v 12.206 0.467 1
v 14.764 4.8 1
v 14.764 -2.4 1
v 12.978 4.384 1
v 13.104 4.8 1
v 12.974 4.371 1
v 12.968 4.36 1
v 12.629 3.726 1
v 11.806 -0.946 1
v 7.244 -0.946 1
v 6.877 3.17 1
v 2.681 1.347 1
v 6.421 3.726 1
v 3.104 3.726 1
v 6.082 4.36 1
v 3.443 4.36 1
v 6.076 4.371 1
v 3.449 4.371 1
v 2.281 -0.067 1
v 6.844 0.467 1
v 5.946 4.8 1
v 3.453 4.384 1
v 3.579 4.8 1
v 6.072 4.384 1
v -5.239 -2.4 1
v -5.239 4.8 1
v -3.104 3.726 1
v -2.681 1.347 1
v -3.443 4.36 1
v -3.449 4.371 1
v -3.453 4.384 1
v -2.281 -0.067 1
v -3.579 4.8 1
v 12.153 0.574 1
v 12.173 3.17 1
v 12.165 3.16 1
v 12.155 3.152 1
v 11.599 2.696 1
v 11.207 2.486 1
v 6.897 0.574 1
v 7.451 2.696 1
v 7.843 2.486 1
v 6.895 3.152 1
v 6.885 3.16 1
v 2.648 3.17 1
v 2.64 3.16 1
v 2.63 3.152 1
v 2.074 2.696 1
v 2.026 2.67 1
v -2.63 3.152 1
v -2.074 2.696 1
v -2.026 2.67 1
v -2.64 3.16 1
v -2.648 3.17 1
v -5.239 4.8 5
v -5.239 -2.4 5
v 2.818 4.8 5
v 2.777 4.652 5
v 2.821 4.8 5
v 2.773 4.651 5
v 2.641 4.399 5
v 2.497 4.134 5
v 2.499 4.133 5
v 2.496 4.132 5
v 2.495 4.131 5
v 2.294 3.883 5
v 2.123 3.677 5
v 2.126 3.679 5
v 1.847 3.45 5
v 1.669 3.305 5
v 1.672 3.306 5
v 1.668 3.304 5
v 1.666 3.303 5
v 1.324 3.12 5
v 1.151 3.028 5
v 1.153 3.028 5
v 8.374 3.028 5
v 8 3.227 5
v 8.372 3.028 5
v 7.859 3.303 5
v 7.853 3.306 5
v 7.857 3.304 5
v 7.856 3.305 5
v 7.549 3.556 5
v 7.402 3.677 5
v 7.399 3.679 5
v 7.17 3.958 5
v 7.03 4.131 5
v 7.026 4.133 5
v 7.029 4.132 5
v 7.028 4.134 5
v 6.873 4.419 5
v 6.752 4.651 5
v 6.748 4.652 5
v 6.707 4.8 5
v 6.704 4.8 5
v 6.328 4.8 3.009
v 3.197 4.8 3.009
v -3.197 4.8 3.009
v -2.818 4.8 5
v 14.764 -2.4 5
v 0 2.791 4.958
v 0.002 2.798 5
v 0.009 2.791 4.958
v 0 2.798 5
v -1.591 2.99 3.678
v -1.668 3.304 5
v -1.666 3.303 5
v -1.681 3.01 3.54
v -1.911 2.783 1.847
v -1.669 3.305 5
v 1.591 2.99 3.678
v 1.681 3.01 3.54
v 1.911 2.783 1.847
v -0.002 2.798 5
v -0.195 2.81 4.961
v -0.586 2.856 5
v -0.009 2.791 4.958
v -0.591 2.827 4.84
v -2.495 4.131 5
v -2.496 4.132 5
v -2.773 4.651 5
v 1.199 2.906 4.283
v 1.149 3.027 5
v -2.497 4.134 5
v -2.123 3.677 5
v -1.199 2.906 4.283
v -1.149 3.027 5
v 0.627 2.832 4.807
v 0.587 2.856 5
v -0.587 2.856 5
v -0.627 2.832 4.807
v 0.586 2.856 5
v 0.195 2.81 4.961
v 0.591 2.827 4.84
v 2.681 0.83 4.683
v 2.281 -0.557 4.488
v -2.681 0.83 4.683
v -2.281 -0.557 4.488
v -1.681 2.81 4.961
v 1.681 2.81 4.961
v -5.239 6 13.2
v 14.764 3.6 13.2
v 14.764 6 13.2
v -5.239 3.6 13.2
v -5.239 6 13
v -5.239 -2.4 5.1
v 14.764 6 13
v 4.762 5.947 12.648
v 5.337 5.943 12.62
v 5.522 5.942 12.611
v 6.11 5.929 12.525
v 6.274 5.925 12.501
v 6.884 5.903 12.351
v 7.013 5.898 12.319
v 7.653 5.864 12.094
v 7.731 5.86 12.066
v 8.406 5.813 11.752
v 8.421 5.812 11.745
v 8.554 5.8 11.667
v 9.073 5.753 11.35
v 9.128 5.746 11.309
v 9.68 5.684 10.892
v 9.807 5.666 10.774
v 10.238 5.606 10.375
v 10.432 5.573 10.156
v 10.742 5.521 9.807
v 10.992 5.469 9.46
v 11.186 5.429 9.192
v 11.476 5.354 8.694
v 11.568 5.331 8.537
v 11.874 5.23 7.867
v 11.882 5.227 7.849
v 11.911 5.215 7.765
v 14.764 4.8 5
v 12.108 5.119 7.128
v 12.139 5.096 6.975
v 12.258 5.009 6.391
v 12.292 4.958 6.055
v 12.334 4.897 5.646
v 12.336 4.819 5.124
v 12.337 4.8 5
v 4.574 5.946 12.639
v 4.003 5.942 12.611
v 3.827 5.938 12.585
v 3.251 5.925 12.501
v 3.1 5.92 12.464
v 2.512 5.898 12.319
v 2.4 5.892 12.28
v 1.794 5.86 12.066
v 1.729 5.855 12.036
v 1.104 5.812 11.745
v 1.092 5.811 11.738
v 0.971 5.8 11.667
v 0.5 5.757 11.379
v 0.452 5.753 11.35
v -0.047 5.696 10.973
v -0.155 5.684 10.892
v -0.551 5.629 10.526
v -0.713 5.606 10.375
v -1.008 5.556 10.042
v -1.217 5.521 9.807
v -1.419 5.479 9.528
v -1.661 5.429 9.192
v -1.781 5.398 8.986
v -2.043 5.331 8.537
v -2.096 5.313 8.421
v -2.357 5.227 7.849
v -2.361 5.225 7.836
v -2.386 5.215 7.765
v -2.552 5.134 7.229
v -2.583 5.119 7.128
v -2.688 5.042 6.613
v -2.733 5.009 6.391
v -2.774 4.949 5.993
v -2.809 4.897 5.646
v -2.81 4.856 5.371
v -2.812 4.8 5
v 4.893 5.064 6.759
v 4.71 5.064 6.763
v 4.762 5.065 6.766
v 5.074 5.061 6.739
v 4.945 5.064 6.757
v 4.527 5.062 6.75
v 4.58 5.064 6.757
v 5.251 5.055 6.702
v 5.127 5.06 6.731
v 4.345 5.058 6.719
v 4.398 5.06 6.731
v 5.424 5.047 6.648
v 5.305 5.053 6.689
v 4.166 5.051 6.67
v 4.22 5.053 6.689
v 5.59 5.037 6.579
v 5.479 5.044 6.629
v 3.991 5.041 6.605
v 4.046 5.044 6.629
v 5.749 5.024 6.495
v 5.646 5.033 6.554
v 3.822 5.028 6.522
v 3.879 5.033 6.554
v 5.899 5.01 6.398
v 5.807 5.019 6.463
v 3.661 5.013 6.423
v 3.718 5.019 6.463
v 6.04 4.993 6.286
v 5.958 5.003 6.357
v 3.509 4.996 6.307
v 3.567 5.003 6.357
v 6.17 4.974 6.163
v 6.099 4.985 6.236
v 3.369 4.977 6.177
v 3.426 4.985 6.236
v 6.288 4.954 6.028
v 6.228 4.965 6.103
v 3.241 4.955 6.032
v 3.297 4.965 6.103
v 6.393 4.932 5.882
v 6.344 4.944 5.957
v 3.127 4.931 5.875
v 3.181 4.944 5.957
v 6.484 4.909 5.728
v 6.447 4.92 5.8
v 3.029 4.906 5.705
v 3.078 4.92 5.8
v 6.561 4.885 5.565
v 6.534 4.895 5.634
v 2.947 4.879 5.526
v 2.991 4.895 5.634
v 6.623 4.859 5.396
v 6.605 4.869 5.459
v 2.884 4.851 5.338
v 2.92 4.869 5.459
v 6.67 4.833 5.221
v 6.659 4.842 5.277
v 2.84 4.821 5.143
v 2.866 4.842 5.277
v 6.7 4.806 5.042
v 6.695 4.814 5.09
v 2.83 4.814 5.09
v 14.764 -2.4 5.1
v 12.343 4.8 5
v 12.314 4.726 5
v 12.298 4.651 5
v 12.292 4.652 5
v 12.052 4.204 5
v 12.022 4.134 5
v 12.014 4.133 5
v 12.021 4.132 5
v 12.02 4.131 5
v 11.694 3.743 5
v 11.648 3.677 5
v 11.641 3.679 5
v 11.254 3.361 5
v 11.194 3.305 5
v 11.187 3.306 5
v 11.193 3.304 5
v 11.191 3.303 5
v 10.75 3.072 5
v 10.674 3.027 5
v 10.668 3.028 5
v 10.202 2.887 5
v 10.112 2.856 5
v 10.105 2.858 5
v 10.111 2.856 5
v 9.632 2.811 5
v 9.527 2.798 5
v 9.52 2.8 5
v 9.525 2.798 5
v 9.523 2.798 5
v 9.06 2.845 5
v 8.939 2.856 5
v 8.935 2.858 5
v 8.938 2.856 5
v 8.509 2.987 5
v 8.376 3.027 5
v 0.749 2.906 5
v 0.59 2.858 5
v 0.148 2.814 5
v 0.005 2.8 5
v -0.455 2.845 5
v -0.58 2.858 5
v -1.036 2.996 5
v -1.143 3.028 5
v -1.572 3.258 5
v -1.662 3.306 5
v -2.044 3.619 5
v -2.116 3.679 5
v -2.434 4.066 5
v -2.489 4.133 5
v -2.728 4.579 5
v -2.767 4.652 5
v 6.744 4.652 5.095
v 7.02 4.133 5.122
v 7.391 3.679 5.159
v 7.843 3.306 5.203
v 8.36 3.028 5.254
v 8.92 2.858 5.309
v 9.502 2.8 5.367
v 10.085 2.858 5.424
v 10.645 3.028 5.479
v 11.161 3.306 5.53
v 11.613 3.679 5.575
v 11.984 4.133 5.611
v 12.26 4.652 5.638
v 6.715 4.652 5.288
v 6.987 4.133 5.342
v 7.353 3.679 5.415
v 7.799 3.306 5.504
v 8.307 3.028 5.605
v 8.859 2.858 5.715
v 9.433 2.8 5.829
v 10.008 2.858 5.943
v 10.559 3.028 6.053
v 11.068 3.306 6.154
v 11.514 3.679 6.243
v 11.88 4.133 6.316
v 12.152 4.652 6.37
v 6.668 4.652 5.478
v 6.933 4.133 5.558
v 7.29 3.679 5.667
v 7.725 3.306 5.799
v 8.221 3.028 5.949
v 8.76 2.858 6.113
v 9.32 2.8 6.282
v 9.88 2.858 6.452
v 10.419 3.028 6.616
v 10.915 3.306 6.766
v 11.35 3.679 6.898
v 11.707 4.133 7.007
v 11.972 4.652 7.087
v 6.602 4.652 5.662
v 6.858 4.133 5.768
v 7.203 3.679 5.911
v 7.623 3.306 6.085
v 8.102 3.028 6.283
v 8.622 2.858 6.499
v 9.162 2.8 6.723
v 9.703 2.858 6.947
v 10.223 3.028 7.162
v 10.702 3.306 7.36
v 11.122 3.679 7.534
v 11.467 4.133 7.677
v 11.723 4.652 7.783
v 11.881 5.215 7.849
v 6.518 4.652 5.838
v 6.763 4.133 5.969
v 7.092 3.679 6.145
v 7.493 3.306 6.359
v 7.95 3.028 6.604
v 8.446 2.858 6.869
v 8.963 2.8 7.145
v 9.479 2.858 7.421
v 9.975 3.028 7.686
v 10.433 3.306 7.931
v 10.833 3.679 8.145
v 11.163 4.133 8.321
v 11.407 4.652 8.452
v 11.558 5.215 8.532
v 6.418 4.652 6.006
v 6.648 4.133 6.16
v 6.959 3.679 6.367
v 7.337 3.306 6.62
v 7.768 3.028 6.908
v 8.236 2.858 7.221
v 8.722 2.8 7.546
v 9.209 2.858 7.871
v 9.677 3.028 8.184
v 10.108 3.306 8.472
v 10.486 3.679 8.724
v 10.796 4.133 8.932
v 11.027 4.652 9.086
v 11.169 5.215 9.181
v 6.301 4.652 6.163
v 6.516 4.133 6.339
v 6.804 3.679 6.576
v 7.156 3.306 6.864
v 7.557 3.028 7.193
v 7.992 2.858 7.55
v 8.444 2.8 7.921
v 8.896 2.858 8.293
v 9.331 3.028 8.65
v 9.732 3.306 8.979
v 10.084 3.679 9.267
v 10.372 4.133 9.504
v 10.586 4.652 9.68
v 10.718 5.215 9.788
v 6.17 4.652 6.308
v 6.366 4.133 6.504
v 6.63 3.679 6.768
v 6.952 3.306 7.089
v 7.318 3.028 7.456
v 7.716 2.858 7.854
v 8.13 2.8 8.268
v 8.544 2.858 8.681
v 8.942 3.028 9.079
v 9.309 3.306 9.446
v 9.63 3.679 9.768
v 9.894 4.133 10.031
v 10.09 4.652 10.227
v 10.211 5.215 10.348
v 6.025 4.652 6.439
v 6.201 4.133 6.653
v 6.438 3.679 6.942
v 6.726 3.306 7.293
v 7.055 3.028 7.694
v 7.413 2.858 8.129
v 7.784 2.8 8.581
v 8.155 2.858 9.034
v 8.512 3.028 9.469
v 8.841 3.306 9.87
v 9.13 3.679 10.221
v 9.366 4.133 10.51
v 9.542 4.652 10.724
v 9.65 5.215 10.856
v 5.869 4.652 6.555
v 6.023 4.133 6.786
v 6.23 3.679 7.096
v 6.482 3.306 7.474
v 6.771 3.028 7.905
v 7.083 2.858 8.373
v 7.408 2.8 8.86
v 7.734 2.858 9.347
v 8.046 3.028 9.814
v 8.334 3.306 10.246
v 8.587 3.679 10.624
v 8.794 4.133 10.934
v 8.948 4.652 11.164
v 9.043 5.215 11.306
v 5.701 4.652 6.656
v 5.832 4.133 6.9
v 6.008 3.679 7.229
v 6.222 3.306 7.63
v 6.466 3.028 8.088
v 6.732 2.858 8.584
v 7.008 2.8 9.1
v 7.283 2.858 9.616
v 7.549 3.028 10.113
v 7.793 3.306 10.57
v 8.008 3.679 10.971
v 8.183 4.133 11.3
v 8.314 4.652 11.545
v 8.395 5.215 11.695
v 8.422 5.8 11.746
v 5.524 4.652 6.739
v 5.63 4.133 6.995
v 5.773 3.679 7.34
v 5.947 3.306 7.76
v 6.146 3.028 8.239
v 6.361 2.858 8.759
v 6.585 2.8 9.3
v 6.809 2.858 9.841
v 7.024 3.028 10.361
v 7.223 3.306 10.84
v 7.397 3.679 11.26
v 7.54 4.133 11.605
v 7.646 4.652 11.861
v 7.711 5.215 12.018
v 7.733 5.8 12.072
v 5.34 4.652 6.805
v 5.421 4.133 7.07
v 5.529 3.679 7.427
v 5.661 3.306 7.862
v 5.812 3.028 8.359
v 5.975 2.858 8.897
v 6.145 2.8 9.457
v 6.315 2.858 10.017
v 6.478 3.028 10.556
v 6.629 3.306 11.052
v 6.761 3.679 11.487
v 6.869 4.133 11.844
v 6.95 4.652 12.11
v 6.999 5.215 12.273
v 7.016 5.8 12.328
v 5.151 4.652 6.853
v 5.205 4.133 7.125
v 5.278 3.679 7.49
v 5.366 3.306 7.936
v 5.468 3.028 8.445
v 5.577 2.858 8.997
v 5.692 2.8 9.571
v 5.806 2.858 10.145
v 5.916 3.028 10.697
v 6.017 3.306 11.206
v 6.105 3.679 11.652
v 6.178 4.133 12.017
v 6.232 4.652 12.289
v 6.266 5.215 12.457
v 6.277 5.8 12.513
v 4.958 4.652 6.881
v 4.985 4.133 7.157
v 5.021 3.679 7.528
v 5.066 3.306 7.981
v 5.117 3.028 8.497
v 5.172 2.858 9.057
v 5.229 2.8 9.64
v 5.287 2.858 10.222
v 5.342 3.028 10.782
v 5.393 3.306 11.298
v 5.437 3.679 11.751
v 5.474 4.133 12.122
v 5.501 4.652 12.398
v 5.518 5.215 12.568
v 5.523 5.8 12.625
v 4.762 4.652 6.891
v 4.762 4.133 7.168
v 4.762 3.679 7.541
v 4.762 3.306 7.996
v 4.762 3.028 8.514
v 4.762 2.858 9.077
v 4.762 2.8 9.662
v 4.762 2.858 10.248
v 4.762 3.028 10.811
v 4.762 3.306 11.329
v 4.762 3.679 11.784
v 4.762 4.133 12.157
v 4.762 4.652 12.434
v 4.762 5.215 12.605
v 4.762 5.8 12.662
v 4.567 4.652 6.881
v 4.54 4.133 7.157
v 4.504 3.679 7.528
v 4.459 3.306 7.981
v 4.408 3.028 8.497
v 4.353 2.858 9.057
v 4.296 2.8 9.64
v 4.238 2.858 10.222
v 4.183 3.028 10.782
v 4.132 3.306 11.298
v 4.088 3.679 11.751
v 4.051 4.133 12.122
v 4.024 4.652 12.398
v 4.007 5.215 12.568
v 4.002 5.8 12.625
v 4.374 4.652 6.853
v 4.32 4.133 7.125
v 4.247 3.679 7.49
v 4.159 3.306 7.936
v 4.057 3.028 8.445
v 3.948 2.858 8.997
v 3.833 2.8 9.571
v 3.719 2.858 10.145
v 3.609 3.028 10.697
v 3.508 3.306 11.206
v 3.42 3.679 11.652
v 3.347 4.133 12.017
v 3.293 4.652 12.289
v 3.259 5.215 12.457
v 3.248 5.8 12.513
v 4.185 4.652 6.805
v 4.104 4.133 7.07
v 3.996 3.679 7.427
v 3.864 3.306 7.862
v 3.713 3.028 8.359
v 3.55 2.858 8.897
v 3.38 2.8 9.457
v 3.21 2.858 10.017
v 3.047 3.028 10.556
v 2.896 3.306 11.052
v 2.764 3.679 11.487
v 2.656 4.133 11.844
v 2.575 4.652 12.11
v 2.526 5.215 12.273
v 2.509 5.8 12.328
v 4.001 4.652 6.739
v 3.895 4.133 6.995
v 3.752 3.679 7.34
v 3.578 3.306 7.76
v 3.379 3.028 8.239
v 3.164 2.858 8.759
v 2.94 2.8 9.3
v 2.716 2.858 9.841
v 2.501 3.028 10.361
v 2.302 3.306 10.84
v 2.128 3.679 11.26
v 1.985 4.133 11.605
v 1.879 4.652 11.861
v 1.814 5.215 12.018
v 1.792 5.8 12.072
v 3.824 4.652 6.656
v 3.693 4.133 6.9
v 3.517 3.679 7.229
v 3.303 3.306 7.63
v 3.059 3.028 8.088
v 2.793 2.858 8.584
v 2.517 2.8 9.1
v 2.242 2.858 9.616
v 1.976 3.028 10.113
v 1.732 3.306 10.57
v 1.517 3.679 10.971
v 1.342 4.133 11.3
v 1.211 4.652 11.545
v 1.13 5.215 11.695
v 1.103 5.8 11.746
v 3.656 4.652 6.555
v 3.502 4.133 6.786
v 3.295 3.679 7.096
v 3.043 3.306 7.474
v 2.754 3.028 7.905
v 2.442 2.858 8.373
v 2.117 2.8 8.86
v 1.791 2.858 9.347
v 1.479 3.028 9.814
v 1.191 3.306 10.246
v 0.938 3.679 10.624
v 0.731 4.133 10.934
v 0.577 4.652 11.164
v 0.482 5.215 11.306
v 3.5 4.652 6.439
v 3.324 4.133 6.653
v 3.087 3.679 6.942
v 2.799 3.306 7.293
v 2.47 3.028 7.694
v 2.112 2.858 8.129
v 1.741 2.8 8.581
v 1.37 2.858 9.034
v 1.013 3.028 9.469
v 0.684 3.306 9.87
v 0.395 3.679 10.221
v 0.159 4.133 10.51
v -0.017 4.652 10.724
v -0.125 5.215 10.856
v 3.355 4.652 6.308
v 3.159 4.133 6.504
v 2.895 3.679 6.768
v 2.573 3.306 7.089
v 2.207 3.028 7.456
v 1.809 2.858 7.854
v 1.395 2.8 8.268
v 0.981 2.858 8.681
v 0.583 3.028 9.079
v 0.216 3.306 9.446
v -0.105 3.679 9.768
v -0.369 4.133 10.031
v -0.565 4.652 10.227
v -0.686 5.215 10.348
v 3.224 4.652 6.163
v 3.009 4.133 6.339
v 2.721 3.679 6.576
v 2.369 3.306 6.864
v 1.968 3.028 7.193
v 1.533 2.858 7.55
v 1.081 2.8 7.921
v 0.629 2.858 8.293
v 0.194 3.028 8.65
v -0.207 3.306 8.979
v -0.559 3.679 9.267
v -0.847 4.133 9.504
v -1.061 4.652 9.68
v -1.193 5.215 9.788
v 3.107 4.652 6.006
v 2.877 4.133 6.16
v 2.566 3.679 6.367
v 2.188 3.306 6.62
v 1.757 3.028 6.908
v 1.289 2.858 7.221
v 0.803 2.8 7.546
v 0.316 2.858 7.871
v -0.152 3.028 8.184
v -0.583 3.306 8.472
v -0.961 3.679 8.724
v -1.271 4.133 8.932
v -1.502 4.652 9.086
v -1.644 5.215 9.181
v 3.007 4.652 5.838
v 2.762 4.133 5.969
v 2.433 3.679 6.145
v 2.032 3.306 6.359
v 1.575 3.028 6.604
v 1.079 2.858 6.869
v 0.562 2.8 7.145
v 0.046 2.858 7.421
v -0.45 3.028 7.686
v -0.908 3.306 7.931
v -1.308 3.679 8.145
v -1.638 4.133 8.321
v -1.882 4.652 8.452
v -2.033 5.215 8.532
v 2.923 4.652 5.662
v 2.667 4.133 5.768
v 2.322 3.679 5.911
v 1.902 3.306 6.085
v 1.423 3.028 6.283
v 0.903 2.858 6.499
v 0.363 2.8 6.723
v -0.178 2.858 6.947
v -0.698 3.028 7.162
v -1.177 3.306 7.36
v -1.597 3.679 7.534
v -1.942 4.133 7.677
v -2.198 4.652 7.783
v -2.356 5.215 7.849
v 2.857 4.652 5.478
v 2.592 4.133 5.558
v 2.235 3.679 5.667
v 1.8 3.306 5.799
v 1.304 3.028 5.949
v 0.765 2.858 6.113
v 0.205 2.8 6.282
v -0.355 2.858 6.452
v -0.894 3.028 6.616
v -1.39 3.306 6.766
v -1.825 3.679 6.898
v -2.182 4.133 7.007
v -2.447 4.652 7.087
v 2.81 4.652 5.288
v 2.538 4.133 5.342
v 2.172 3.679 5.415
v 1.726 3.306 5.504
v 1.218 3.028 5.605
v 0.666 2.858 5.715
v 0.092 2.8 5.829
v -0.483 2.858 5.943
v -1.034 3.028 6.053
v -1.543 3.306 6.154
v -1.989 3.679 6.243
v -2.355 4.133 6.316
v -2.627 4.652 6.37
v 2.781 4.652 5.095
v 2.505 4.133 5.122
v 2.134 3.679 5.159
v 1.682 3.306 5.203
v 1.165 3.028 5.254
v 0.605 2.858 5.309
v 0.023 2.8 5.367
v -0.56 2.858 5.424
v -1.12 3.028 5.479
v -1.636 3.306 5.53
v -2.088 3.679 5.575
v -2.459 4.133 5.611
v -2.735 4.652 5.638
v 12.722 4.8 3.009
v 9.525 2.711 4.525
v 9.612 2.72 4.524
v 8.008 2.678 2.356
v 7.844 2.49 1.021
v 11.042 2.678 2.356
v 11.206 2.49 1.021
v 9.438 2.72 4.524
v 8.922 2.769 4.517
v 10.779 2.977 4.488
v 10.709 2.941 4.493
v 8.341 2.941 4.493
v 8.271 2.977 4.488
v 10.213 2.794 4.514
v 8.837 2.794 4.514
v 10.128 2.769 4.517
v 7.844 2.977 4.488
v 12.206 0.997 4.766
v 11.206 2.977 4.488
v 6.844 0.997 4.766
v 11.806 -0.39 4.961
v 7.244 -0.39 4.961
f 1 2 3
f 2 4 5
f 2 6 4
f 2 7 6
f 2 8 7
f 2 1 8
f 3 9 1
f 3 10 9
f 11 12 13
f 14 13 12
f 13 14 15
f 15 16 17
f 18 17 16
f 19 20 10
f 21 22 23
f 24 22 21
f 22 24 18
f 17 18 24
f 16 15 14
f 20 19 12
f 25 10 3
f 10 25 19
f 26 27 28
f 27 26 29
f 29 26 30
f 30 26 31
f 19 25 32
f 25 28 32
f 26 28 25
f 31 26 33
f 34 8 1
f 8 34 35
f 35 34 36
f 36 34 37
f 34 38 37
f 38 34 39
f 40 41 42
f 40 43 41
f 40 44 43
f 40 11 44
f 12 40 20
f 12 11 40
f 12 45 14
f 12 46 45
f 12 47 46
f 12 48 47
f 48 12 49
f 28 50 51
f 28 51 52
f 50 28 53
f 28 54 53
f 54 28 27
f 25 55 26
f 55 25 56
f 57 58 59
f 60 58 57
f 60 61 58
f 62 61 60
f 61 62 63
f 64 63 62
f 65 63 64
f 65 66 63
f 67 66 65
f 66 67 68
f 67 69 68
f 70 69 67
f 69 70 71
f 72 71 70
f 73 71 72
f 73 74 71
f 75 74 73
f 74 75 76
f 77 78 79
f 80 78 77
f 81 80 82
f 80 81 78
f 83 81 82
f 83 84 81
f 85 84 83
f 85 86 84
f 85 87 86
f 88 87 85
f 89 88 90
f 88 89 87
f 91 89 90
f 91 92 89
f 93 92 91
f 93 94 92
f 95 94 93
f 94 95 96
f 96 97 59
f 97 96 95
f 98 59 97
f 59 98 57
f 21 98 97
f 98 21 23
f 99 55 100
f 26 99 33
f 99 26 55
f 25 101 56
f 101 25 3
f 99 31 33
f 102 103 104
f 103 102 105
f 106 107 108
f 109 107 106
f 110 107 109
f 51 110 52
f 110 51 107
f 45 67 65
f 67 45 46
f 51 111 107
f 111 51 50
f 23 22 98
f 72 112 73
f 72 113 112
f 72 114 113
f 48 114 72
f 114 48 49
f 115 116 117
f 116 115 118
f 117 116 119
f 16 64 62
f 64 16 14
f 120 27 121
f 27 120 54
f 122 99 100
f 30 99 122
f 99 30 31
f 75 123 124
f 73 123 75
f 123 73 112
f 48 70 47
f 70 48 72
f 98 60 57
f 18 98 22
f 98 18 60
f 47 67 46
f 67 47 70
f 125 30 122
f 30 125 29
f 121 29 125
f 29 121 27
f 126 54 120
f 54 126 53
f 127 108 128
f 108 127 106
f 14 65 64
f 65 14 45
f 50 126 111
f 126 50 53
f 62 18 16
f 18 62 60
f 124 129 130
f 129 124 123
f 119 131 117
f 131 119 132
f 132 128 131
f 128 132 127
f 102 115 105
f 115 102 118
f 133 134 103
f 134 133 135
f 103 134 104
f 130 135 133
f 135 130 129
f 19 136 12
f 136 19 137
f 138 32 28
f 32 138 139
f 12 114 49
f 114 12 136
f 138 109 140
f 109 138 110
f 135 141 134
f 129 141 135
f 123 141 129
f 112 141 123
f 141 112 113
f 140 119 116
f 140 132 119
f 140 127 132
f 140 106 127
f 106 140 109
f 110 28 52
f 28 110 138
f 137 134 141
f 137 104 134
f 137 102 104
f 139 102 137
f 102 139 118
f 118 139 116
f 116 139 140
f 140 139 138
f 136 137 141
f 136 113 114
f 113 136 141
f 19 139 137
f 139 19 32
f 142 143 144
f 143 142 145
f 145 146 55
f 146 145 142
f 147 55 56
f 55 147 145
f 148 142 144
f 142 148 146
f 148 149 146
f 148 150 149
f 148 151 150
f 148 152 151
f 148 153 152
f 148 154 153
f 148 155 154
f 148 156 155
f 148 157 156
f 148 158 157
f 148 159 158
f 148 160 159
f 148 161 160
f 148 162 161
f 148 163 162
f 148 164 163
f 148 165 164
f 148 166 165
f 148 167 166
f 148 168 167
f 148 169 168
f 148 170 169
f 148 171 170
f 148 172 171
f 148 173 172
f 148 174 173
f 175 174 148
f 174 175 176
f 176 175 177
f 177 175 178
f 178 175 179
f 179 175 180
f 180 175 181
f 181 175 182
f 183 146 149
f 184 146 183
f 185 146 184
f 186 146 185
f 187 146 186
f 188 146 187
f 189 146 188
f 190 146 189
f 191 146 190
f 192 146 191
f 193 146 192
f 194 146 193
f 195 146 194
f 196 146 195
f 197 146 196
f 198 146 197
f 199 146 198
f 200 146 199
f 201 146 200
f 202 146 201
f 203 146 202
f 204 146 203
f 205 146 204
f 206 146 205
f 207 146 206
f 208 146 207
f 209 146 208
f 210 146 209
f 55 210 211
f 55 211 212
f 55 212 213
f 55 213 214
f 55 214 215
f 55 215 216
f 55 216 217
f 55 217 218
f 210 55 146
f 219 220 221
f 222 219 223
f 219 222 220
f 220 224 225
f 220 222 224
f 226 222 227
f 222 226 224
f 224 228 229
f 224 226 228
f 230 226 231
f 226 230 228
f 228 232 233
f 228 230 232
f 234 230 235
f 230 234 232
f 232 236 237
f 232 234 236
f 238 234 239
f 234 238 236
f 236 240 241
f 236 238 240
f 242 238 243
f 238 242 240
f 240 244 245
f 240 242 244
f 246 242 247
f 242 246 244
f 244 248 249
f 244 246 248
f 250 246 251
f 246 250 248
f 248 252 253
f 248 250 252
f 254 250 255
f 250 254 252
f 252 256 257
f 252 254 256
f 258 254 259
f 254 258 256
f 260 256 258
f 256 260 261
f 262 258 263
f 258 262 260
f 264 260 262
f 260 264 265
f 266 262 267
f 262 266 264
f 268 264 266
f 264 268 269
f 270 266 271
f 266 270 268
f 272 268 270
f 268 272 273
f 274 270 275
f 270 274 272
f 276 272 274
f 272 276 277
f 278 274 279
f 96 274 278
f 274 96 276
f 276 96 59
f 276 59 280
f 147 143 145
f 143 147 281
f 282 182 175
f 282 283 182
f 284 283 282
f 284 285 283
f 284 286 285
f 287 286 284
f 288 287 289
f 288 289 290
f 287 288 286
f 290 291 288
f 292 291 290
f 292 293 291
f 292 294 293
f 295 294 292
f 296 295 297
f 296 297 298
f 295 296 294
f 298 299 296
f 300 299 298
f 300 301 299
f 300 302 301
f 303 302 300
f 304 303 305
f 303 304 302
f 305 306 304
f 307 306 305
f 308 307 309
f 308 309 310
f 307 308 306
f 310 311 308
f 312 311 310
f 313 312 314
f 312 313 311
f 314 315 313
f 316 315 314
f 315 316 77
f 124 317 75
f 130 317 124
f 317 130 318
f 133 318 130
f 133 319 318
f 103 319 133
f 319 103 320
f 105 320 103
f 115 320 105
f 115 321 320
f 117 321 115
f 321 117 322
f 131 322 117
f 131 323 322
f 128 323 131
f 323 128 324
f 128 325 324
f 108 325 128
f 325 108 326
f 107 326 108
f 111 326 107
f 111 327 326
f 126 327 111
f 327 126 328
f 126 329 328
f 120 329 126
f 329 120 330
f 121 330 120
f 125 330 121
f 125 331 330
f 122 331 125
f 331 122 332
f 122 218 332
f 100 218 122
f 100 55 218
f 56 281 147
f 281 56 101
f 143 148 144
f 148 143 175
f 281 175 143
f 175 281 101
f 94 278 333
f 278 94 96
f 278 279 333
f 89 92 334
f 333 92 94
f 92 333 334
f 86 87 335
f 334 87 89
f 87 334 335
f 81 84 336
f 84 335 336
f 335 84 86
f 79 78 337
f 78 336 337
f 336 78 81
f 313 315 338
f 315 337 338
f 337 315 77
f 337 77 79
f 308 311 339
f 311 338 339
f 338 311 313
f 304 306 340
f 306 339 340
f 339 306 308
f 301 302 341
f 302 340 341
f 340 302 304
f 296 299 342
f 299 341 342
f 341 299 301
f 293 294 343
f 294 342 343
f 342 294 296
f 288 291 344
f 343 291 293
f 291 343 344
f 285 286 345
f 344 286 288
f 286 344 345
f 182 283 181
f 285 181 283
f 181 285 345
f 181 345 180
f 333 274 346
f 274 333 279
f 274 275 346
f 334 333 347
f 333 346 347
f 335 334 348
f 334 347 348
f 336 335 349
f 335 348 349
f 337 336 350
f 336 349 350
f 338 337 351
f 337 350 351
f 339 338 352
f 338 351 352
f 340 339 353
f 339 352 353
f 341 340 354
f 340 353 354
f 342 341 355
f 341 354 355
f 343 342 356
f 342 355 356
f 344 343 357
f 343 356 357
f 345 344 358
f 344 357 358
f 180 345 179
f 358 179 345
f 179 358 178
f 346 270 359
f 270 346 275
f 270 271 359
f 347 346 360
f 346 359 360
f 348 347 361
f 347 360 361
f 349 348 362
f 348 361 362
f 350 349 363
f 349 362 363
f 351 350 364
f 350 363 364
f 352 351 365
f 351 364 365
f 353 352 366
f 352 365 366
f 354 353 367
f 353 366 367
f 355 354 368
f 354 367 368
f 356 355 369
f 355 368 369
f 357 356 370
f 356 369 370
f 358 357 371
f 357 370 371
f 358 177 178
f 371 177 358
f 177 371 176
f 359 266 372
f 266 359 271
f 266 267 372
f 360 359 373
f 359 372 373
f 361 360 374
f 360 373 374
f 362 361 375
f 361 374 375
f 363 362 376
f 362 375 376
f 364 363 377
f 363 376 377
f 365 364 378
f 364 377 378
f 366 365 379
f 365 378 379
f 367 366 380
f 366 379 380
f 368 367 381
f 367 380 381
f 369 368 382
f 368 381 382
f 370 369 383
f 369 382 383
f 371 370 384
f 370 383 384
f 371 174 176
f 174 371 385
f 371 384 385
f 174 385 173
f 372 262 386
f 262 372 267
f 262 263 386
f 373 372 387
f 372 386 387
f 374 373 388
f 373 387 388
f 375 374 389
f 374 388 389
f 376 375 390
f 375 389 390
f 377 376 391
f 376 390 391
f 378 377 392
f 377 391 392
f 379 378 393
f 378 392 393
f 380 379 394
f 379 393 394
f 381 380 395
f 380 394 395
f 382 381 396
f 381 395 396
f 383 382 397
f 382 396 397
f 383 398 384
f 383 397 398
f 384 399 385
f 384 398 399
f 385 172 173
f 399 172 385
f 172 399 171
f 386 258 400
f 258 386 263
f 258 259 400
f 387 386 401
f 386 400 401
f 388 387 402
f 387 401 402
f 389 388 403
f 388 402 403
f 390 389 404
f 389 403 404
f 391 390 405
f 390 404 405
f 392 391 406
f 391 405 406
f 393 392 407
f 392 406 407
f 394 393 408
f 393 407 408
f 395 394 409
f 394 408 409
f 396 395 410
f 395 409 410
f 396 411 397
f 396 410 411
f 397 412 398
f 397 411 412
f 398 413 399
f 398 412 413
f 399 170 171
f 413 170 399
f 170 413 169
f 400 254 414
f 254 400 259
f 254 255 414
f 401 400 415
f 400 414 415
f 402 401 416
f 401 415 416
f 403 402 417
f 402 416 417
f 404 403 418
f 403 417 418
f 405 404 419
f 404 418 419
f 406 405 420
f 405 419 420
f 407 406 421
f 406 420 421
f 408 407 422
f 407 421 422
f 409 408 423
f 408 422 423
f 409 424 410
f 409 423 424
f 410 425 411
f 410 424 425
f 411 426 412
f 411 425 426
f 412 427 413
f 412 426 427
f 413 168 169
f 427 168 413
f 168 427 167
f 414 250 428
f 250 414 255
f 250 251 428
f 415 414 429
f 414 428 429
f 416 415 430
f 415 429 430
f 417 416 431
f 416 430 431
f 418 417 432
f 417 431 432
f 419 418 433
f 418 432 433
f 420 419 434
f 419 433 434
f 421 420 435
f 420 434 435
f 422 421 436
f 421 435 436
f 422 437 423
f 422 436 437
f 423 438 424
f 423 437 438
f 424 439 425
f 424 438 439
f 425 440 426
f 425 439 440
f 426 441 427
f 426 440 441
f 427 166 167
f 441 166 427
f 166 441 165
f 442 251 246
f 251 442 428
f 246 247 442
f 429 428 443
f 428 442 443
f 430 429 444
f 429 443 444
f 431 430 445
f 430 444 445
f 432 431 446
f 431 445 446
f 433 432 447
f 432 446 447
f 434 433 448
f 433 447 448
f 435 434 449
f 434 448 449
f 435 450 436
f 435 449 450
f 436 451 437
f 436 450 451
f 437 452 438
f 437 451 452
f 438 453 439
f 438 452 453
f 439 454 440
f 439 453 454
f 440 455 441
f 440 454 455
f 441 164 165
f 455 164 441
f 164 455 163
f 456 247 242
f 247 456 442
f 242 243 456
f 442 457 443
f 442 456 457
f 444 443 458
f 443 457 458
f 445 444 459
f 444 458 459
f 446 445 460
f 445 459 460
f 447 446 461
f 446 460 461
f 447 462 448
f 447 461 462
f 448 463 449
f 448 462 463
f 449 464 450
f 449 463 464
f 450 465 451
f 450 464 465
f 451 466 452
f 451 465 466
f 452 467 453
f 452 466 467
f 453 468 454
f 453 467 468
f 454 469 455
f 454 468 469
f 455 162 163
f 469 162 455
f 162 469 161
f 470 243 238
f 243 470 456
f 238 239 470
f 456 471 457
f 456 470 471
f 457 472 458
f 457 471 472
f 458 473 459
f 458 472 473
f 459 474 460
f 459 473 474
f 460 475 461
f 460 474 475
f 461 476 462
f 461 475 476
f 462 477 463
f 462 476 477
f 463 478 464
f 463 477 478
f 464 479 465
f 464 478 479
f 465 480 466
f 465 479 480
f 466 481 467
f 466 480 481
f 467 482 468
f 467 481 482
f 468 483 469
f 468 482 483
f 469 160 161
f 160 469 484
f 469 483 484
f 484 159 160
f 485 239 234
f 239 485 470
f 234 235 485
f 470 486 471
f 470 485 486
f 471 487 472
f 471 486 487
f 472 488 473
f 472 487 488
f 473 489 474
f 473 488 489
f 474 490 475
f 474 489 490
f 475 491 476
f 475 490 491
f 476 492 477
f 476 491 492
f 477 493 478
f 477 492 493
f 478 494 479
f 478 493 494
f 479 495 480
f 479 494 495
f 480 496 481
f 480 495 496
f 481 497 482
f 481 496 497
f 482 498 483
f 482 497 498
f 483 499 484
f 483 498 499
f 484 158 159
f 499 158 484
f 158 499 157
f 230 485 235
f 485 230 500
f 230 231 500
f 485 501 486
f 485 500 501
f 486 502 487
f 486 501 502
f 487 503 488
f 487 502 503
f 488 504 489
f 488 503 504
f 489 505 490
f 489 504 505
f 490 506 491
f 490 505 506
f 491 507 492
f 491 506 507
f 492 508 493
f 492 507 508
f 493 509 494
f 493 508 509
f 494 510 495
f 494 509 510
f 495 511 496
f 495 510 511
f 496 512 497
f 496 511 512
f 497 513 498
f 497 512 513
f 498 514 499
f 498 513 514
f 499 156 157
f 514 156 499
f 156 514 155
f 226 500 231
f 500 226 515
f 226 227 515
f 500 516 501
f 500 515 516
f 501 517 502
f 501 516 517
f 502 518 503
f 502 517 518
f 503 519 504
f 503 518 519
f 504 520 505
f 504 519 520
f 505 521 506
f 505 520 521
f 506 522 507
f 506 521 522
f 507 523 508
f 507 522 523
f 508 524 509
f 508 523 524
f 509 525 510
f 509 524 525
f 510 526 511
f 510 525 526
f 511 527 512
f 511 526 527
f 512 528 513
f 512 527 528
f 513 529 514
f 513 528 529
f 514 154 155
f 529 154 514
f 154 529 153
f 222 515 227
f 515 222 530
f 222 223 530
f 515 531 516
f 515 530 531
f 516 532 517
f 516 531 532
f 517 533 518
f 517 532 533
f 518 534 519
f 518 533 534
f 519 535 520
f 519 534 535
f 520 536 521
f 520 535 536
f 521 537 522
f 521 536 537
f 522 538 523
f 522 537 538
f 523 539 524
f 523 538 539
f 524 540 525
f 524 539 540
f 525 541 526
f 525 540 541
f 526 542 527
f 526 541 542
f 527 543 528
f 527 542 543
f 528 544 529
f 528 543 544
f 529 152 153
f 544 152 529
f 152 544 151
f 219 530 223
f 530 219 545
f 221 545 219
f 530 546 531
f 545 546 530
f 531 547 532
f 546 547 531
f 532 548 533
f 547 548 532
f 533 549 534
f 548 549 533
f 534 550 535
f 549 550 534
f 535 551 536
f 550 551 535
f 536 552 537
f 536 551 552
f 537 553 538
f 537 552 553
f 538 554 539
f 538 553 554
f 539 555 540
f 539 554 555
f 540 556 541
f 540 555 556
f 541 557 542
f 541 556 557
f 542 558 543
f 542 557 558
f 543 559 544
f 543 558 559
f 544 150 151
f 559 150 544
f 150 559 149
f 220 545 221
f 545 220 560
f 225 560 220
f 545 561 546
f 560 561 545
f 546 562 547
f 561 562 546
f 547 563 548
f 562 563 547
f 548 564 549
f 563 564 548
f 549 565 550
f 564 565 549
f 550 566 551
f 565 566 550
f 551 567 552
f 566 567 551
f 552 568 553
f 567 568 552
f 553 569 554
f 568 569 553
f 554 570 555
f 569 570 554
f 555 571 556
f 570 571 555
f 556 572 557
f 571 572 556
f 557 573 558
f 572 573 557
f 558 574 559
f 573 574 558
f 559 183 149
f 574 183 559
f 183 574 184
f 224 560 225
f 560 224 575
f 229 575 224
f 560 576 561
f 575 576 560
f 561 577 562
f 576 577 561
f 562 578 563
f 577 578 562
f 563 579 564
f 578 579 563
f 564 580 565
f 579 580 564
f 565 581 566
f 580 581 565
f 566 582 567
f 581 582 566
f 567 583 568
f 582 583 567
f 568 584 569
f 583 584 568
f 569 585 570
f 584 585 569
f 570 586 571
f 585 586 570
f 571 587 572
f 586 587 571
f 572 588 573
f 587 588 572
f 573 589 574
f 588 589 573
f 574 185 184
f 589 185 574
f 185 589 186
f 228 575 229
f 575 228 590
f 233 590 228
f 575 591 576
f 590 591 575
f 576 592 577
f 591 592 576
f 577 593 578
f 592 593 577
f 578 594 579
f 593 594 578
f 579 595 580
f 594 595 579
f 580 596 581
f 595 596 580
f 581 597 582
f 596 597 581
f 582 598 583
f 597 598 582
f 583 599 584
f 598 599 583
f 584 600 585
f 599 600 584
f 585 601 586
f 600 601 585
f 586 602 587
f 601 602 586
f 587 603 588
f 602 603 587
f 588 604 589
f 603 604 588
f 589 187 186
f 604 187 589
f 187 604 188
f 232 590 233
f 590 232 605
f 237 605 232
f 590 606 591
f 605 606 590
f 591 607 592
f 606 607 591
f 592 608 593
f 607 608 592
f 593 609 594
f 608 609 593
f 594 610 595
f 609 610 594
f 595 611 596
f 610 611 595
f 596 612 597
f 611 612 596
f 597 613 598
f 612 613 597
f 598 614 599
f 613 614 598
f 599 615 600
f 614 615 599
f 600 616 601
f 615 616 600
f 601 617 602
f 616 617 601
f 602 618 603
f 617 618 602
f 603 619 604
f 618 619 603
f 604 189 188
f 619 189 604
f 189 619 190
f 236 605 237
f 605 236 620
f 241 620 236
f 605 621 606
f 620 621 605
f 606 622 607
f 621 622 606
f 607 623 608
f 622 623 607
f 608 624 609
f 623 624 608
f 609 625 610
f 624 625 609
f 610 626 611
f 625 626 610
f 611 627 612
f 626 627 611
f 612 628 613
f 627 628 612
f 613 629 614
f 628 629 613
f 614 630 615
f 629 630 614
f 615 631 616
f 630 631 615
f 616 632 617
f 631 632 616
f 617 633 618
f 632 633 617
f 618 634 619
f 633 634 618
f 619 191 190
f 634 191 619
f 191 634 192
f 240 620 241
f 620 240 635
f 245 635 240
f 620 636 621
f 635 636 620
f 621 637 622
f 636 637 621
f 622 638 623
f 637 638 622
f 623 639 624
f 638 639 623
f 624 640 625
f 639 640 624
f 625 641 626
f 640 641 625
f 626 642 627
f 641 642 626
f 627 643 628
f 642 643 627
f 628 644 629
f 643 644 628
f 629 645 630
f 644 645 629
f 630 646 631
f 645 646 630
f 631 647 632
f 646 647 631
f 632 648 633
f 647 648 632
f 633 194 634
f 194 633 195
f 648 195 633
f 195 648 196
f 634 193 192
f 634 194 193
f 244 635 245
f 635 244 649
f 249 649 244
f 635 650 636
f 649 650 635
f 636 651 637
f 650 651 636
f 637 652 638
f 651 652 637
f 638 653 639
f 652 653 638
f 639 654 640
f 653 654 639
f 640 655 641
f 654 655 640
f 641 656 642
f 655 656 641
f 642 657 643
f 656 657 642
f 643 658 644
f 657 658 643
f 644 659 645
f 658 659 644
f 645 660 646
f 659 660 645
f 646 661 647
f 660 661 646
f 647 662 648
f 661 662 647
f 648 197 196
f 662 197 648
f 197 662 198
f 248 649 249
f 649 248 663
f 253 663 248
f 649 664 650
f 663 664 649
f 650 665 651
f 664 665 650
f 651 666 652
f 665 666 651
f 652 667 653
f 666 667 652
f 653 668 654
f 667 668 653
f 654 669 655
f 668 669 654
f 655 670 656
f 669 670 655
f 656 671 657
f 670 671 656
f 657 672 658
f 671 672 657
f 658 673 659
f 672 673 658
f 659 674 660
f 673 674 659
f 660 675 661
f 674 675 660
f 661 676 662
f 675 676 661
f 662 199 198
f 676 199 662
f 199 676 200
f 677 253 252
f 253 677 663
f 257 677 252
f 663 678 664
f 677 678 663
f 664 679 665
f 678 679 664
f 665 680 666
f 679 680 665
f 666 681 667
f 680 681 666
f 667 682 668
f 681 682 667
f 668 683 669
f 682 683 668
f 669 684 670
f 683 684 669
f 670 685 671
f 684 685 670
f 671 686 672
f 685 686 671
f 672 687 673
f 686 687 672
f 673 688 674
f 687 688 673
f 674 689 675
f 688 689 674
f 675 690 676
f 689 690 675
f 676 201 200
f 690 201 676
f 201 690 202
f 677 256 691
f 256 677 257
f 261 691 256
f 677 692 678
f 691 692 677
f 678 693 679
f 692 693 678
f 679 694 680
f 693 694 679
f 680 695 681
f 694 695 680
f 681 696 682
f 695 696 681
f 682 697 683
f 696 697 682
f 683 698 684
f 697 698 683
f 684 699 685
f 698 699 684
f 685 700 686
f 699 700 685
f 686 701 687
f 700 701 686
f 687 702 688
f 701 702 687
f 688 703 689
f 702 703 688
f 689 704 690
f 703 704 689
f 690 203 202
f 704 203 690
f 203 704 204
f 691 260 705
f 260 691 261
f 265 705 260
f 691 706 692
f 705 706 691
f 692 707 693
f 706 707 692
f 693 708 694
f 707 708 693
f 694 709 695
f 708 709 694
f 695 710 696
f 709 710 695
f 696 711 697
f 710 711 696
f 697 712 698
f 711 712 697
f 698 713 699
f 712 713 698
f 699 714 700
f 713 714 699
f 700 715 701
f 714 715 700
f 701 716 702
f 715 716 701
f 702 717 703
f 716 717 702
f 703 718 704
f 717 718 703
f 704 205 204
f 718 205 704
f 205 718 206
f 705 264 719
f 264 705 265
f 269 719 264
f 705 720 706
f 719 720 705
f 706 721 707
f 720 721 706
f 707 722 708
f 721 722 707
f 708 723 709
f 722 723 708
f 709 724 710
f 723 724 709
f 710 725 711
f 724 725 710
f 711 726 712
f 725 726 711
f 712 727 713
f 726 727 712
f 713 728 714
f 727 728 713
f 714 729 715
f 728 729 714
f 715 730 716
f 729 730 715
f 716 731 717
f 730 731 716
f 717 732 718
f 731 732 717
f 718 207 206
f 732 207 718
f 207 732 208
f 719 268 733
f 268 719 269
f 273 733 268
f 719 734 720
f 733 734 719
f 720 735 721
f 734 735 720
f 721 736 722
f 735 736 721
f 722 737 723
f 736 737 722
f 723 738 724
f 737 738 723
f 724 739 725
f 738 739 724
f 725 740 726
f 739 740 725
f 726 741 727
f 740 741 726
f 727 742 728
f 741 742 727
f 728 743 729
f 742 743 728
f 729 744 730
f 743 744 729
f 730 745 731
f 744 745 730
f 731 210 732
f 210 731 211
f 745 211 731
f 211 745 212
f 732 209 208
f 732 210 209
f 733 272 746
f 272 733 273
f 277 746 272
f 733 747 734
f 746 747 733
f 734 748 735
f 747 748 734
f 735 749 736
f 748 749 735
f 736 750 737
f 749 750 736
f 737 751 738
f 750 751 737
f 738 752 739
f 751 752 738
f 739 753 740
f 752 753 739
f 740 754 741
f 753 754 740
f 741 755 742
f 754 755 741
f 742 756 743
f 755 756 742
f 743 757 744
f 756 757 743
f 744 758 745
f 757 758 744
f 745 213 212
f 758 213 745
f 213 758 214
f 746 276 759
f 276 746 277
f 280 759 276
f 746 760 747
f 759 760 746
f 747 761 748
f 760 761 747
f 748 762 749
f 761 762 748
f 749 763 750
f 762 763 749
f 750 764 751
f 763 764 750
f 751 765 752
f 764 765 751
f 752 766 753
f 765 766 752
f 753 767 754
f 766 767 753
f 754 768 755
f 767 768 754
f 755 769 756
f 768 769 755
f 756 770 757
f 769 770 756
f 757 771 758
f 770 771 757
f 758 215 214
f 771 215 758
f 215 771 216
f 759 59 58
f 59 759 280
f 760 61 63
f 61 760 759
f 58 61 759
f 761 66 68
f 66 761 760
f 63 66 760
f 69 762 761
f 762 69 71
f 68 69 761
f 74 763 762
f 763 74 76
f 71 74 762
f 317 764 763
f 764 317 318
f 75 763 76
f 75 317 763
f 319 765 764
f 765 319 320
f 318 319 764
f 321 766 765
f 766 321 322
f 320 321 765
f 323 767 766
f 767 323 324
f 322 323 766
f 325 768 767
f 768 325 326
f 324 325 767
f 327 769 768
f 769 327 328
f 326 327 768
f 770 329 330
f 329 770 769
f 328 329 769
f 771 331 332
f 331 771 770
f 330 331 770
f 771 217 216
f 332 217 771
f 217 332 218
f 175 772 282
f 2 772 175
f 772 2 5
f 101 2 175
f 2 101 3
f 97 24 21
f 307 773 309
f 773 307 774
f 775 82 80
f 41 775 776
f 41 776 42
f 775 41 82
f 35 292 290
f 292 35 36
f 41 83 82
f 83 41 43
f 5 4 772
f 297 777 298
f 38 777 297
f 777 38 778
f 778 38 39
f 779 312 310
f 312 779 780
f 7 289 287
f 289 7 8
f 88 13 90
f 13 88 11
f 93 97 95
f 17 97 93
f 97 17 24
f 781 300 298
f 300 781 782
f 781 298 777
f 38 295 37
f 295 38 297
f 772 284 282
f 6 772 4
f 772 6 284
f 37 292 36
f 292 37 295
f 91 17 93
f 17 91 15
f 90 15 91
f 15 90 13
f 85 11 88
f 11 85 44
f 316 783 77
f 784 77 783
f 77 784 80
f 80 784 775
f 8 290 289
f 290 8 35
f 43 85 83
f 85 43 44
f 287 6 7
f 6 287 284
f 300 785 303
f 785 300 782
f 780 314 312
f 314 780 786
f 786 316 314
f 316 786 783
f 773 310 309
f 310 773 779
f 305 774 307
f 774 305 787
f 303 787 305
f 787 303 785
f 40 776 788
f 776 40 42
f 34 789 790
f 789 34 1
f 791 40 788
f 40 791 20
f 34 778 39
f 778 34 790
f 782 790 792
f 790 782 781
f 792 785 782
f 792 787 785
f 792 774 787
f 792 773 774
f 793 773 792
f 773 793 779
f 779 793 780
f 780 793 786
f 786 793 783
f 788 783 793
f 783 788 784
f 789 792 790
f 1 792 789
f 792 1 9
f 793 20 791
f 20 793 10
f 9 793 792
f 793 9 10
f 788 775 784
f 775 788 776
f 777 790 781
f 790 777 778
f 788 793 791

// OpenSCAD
//MD = 3.175;
MD = 4.7625;
LAYER_HEIGHT = 0.2;

// REFERENCE CIRCLE
*translate([0, 5 * MD / 6])  circle(d = MD, $fn = 32);

// Figure S Track
*group() {
  difference() {
    union() {
      rotate([0,0,45]) rotate_extrude(angle = 270, $fn = 128)
        translate([10, 0, 0])
          flatTrack();

      translate([cos(45) * 20, sin(45) * 20])
        rotate([0,0,-135]) rotate_extrude(angle = 270, $fn = 128)
          translate([10, 0, 0])
            flatTrack();
    }
  }
}

H_EXTRA = 0;
hExtra = H_EXTRA;
holeDLayers = ceil(MD * 1.25 / LAYER_HEIGHT);
holeD = holeDLayers * LAYER_HEIGHT;
ty = holeD - 0.2;
baseYs = [6, holeDLayers + hExtra];
base = [MD * 2.1, LAYER_HEIGHT * (baseYs[0] + baseYs[1])];

group() {
  trackConnectorTunnel();

  translate([MD, ty, 4.9]) {
    difference() {
      union() {
        translate(
          [
            -base[0], 
            -base[1] / 2 - 2.2, 
            0.1
          ]
        )
        
        hull() {
          linear_extrude(0.1)
            translate([0, -base[1] / 2 + 1.2])
            square([base[0] * 2, base[1]]);
            
            translate([0, base[1] / 2, 8]) 
              linear_extrude(0.2)
                square([base[0] * 2, base[1] / 3]);          
        }
      }
      
      rotate([90, 0, 0])
        rotate_extrude(angle = 180, convexity = 4, $fn = 64) 
          translate([MD, 0, 0]) 
            circle(d = holeD, $fn = 32);
    }  
  }

  translate([MD * 2, 0])
    trackConnectorTunnel(angle = -8);
}

*linear_extrude(30) flatTrack();

*translate([0, MD + 0.15]) circle(d = MD, $fn = 32);


module tunnelPair(h, baseTr, base, holeTr, holeD, angle = 5) {
  difference() {
    difference() {
    linear_extrude(h)
      translate(baseTr) 
        square(base);
      
    translate(holeTr)
      translate([0, 0, -0.1])
      hull() {
        cylinder(h = 0.01, d = holeD * 1.25, $fn = 32);
        
        translate([0, 0, h + 0.1]) 
          cylinder(h = 0.01, d = holeD, $fn = 32);
     
     }
 }
      
  ty = (angle < 0 ? 1 : -1) * sin(angle) * FTY2 * LAYER_HEIGHT;
 
  translate([0, angle < 0 ? ty * 2: 0, angle < 0 ? 0 : ty]) 
    rotate([angle, 0, 0]) 
      linear_extrude(h) 
        flatTrack(lowerMid = false);
  }
}

module trackConnectorTunnel(d = MD, h = 5, lh = LAYER_HEIGHT, angle = 8, hExtra = H_EXTRA) {
  holeDLayers = ceil(d * 1.25 / lh);
  holeD = holeDLayers * lh;
  holeTr = [0, holeD - 0.2];

  baseYs = [12, holeDLayers + hExtra - 6];
  base = [d * 2.2, lh * (baseYs[0] + baseYs[1])];
  baseTr = [-base[0] / 2, -1 * lh * baseYs[0]];
  
  translate([0, 0, h]) {
    translate([0, 0, -(h - 1)]) 
      tunnelPair(h - 1, baseTr, base, holeTr, holeD, angle);
    
    *translate([0, 0, 0])
      linear_extrude(1)
        difference() {
          translate(baseTr) 
            square(base);

          translate(holeTr)
            circle(d = holeD, $fn = 32);
        }
  }
}

FTY1 = 7;
FTY2 = 17;

module flatTrack(d = MD, lh = LAYER_HEIGHT, lowerMid = true) {
  ys = [0, FTY1, FTY2];
  halfD = d / 2;
  r = d / 2;
  sinHalfD = halfD * sin(45);
  h = lh * 8;
  
  polygon([
    [r, 0],
    [r - 0.1, ys[0] * lh],
    [r + 0.3, ys[1] * lh],
    [r - 0.7, ys[2] * lh],
    lowerMid ? [0, ys[1] * lh] : [0, ys[2] * lh],
    [-r + 0.7, ys[2] * lh],
    [-r - 0.3, ys[1] * lh],
    [-r + 0.1, ys[0] * lh],
    [-r, 0],
  ]);
}

module uTrackSlicer(d = MD) {
  circle(d = d, $fn = 64);
}

module uTrack(d = MD) {
  innerD = d;
  outerD = d + (0.4 * 5);
  
  baseW = outerD * cos(45);
  baseTX = -baseW / 2;
  baseTY = -d / 1.125 * cos(30);
  
  intersection() {
    difference() {
      union() {
        circle(d = outerD, $fn = 8);
        translate([baseTX, baseTY]) 
          square([baseW, d]);
      }
      
      uTrackSlicer(d);
    }
    
    translate([-innerD, baseTY])
      square([innerD * 2, outerD / 3]);
  }
}
